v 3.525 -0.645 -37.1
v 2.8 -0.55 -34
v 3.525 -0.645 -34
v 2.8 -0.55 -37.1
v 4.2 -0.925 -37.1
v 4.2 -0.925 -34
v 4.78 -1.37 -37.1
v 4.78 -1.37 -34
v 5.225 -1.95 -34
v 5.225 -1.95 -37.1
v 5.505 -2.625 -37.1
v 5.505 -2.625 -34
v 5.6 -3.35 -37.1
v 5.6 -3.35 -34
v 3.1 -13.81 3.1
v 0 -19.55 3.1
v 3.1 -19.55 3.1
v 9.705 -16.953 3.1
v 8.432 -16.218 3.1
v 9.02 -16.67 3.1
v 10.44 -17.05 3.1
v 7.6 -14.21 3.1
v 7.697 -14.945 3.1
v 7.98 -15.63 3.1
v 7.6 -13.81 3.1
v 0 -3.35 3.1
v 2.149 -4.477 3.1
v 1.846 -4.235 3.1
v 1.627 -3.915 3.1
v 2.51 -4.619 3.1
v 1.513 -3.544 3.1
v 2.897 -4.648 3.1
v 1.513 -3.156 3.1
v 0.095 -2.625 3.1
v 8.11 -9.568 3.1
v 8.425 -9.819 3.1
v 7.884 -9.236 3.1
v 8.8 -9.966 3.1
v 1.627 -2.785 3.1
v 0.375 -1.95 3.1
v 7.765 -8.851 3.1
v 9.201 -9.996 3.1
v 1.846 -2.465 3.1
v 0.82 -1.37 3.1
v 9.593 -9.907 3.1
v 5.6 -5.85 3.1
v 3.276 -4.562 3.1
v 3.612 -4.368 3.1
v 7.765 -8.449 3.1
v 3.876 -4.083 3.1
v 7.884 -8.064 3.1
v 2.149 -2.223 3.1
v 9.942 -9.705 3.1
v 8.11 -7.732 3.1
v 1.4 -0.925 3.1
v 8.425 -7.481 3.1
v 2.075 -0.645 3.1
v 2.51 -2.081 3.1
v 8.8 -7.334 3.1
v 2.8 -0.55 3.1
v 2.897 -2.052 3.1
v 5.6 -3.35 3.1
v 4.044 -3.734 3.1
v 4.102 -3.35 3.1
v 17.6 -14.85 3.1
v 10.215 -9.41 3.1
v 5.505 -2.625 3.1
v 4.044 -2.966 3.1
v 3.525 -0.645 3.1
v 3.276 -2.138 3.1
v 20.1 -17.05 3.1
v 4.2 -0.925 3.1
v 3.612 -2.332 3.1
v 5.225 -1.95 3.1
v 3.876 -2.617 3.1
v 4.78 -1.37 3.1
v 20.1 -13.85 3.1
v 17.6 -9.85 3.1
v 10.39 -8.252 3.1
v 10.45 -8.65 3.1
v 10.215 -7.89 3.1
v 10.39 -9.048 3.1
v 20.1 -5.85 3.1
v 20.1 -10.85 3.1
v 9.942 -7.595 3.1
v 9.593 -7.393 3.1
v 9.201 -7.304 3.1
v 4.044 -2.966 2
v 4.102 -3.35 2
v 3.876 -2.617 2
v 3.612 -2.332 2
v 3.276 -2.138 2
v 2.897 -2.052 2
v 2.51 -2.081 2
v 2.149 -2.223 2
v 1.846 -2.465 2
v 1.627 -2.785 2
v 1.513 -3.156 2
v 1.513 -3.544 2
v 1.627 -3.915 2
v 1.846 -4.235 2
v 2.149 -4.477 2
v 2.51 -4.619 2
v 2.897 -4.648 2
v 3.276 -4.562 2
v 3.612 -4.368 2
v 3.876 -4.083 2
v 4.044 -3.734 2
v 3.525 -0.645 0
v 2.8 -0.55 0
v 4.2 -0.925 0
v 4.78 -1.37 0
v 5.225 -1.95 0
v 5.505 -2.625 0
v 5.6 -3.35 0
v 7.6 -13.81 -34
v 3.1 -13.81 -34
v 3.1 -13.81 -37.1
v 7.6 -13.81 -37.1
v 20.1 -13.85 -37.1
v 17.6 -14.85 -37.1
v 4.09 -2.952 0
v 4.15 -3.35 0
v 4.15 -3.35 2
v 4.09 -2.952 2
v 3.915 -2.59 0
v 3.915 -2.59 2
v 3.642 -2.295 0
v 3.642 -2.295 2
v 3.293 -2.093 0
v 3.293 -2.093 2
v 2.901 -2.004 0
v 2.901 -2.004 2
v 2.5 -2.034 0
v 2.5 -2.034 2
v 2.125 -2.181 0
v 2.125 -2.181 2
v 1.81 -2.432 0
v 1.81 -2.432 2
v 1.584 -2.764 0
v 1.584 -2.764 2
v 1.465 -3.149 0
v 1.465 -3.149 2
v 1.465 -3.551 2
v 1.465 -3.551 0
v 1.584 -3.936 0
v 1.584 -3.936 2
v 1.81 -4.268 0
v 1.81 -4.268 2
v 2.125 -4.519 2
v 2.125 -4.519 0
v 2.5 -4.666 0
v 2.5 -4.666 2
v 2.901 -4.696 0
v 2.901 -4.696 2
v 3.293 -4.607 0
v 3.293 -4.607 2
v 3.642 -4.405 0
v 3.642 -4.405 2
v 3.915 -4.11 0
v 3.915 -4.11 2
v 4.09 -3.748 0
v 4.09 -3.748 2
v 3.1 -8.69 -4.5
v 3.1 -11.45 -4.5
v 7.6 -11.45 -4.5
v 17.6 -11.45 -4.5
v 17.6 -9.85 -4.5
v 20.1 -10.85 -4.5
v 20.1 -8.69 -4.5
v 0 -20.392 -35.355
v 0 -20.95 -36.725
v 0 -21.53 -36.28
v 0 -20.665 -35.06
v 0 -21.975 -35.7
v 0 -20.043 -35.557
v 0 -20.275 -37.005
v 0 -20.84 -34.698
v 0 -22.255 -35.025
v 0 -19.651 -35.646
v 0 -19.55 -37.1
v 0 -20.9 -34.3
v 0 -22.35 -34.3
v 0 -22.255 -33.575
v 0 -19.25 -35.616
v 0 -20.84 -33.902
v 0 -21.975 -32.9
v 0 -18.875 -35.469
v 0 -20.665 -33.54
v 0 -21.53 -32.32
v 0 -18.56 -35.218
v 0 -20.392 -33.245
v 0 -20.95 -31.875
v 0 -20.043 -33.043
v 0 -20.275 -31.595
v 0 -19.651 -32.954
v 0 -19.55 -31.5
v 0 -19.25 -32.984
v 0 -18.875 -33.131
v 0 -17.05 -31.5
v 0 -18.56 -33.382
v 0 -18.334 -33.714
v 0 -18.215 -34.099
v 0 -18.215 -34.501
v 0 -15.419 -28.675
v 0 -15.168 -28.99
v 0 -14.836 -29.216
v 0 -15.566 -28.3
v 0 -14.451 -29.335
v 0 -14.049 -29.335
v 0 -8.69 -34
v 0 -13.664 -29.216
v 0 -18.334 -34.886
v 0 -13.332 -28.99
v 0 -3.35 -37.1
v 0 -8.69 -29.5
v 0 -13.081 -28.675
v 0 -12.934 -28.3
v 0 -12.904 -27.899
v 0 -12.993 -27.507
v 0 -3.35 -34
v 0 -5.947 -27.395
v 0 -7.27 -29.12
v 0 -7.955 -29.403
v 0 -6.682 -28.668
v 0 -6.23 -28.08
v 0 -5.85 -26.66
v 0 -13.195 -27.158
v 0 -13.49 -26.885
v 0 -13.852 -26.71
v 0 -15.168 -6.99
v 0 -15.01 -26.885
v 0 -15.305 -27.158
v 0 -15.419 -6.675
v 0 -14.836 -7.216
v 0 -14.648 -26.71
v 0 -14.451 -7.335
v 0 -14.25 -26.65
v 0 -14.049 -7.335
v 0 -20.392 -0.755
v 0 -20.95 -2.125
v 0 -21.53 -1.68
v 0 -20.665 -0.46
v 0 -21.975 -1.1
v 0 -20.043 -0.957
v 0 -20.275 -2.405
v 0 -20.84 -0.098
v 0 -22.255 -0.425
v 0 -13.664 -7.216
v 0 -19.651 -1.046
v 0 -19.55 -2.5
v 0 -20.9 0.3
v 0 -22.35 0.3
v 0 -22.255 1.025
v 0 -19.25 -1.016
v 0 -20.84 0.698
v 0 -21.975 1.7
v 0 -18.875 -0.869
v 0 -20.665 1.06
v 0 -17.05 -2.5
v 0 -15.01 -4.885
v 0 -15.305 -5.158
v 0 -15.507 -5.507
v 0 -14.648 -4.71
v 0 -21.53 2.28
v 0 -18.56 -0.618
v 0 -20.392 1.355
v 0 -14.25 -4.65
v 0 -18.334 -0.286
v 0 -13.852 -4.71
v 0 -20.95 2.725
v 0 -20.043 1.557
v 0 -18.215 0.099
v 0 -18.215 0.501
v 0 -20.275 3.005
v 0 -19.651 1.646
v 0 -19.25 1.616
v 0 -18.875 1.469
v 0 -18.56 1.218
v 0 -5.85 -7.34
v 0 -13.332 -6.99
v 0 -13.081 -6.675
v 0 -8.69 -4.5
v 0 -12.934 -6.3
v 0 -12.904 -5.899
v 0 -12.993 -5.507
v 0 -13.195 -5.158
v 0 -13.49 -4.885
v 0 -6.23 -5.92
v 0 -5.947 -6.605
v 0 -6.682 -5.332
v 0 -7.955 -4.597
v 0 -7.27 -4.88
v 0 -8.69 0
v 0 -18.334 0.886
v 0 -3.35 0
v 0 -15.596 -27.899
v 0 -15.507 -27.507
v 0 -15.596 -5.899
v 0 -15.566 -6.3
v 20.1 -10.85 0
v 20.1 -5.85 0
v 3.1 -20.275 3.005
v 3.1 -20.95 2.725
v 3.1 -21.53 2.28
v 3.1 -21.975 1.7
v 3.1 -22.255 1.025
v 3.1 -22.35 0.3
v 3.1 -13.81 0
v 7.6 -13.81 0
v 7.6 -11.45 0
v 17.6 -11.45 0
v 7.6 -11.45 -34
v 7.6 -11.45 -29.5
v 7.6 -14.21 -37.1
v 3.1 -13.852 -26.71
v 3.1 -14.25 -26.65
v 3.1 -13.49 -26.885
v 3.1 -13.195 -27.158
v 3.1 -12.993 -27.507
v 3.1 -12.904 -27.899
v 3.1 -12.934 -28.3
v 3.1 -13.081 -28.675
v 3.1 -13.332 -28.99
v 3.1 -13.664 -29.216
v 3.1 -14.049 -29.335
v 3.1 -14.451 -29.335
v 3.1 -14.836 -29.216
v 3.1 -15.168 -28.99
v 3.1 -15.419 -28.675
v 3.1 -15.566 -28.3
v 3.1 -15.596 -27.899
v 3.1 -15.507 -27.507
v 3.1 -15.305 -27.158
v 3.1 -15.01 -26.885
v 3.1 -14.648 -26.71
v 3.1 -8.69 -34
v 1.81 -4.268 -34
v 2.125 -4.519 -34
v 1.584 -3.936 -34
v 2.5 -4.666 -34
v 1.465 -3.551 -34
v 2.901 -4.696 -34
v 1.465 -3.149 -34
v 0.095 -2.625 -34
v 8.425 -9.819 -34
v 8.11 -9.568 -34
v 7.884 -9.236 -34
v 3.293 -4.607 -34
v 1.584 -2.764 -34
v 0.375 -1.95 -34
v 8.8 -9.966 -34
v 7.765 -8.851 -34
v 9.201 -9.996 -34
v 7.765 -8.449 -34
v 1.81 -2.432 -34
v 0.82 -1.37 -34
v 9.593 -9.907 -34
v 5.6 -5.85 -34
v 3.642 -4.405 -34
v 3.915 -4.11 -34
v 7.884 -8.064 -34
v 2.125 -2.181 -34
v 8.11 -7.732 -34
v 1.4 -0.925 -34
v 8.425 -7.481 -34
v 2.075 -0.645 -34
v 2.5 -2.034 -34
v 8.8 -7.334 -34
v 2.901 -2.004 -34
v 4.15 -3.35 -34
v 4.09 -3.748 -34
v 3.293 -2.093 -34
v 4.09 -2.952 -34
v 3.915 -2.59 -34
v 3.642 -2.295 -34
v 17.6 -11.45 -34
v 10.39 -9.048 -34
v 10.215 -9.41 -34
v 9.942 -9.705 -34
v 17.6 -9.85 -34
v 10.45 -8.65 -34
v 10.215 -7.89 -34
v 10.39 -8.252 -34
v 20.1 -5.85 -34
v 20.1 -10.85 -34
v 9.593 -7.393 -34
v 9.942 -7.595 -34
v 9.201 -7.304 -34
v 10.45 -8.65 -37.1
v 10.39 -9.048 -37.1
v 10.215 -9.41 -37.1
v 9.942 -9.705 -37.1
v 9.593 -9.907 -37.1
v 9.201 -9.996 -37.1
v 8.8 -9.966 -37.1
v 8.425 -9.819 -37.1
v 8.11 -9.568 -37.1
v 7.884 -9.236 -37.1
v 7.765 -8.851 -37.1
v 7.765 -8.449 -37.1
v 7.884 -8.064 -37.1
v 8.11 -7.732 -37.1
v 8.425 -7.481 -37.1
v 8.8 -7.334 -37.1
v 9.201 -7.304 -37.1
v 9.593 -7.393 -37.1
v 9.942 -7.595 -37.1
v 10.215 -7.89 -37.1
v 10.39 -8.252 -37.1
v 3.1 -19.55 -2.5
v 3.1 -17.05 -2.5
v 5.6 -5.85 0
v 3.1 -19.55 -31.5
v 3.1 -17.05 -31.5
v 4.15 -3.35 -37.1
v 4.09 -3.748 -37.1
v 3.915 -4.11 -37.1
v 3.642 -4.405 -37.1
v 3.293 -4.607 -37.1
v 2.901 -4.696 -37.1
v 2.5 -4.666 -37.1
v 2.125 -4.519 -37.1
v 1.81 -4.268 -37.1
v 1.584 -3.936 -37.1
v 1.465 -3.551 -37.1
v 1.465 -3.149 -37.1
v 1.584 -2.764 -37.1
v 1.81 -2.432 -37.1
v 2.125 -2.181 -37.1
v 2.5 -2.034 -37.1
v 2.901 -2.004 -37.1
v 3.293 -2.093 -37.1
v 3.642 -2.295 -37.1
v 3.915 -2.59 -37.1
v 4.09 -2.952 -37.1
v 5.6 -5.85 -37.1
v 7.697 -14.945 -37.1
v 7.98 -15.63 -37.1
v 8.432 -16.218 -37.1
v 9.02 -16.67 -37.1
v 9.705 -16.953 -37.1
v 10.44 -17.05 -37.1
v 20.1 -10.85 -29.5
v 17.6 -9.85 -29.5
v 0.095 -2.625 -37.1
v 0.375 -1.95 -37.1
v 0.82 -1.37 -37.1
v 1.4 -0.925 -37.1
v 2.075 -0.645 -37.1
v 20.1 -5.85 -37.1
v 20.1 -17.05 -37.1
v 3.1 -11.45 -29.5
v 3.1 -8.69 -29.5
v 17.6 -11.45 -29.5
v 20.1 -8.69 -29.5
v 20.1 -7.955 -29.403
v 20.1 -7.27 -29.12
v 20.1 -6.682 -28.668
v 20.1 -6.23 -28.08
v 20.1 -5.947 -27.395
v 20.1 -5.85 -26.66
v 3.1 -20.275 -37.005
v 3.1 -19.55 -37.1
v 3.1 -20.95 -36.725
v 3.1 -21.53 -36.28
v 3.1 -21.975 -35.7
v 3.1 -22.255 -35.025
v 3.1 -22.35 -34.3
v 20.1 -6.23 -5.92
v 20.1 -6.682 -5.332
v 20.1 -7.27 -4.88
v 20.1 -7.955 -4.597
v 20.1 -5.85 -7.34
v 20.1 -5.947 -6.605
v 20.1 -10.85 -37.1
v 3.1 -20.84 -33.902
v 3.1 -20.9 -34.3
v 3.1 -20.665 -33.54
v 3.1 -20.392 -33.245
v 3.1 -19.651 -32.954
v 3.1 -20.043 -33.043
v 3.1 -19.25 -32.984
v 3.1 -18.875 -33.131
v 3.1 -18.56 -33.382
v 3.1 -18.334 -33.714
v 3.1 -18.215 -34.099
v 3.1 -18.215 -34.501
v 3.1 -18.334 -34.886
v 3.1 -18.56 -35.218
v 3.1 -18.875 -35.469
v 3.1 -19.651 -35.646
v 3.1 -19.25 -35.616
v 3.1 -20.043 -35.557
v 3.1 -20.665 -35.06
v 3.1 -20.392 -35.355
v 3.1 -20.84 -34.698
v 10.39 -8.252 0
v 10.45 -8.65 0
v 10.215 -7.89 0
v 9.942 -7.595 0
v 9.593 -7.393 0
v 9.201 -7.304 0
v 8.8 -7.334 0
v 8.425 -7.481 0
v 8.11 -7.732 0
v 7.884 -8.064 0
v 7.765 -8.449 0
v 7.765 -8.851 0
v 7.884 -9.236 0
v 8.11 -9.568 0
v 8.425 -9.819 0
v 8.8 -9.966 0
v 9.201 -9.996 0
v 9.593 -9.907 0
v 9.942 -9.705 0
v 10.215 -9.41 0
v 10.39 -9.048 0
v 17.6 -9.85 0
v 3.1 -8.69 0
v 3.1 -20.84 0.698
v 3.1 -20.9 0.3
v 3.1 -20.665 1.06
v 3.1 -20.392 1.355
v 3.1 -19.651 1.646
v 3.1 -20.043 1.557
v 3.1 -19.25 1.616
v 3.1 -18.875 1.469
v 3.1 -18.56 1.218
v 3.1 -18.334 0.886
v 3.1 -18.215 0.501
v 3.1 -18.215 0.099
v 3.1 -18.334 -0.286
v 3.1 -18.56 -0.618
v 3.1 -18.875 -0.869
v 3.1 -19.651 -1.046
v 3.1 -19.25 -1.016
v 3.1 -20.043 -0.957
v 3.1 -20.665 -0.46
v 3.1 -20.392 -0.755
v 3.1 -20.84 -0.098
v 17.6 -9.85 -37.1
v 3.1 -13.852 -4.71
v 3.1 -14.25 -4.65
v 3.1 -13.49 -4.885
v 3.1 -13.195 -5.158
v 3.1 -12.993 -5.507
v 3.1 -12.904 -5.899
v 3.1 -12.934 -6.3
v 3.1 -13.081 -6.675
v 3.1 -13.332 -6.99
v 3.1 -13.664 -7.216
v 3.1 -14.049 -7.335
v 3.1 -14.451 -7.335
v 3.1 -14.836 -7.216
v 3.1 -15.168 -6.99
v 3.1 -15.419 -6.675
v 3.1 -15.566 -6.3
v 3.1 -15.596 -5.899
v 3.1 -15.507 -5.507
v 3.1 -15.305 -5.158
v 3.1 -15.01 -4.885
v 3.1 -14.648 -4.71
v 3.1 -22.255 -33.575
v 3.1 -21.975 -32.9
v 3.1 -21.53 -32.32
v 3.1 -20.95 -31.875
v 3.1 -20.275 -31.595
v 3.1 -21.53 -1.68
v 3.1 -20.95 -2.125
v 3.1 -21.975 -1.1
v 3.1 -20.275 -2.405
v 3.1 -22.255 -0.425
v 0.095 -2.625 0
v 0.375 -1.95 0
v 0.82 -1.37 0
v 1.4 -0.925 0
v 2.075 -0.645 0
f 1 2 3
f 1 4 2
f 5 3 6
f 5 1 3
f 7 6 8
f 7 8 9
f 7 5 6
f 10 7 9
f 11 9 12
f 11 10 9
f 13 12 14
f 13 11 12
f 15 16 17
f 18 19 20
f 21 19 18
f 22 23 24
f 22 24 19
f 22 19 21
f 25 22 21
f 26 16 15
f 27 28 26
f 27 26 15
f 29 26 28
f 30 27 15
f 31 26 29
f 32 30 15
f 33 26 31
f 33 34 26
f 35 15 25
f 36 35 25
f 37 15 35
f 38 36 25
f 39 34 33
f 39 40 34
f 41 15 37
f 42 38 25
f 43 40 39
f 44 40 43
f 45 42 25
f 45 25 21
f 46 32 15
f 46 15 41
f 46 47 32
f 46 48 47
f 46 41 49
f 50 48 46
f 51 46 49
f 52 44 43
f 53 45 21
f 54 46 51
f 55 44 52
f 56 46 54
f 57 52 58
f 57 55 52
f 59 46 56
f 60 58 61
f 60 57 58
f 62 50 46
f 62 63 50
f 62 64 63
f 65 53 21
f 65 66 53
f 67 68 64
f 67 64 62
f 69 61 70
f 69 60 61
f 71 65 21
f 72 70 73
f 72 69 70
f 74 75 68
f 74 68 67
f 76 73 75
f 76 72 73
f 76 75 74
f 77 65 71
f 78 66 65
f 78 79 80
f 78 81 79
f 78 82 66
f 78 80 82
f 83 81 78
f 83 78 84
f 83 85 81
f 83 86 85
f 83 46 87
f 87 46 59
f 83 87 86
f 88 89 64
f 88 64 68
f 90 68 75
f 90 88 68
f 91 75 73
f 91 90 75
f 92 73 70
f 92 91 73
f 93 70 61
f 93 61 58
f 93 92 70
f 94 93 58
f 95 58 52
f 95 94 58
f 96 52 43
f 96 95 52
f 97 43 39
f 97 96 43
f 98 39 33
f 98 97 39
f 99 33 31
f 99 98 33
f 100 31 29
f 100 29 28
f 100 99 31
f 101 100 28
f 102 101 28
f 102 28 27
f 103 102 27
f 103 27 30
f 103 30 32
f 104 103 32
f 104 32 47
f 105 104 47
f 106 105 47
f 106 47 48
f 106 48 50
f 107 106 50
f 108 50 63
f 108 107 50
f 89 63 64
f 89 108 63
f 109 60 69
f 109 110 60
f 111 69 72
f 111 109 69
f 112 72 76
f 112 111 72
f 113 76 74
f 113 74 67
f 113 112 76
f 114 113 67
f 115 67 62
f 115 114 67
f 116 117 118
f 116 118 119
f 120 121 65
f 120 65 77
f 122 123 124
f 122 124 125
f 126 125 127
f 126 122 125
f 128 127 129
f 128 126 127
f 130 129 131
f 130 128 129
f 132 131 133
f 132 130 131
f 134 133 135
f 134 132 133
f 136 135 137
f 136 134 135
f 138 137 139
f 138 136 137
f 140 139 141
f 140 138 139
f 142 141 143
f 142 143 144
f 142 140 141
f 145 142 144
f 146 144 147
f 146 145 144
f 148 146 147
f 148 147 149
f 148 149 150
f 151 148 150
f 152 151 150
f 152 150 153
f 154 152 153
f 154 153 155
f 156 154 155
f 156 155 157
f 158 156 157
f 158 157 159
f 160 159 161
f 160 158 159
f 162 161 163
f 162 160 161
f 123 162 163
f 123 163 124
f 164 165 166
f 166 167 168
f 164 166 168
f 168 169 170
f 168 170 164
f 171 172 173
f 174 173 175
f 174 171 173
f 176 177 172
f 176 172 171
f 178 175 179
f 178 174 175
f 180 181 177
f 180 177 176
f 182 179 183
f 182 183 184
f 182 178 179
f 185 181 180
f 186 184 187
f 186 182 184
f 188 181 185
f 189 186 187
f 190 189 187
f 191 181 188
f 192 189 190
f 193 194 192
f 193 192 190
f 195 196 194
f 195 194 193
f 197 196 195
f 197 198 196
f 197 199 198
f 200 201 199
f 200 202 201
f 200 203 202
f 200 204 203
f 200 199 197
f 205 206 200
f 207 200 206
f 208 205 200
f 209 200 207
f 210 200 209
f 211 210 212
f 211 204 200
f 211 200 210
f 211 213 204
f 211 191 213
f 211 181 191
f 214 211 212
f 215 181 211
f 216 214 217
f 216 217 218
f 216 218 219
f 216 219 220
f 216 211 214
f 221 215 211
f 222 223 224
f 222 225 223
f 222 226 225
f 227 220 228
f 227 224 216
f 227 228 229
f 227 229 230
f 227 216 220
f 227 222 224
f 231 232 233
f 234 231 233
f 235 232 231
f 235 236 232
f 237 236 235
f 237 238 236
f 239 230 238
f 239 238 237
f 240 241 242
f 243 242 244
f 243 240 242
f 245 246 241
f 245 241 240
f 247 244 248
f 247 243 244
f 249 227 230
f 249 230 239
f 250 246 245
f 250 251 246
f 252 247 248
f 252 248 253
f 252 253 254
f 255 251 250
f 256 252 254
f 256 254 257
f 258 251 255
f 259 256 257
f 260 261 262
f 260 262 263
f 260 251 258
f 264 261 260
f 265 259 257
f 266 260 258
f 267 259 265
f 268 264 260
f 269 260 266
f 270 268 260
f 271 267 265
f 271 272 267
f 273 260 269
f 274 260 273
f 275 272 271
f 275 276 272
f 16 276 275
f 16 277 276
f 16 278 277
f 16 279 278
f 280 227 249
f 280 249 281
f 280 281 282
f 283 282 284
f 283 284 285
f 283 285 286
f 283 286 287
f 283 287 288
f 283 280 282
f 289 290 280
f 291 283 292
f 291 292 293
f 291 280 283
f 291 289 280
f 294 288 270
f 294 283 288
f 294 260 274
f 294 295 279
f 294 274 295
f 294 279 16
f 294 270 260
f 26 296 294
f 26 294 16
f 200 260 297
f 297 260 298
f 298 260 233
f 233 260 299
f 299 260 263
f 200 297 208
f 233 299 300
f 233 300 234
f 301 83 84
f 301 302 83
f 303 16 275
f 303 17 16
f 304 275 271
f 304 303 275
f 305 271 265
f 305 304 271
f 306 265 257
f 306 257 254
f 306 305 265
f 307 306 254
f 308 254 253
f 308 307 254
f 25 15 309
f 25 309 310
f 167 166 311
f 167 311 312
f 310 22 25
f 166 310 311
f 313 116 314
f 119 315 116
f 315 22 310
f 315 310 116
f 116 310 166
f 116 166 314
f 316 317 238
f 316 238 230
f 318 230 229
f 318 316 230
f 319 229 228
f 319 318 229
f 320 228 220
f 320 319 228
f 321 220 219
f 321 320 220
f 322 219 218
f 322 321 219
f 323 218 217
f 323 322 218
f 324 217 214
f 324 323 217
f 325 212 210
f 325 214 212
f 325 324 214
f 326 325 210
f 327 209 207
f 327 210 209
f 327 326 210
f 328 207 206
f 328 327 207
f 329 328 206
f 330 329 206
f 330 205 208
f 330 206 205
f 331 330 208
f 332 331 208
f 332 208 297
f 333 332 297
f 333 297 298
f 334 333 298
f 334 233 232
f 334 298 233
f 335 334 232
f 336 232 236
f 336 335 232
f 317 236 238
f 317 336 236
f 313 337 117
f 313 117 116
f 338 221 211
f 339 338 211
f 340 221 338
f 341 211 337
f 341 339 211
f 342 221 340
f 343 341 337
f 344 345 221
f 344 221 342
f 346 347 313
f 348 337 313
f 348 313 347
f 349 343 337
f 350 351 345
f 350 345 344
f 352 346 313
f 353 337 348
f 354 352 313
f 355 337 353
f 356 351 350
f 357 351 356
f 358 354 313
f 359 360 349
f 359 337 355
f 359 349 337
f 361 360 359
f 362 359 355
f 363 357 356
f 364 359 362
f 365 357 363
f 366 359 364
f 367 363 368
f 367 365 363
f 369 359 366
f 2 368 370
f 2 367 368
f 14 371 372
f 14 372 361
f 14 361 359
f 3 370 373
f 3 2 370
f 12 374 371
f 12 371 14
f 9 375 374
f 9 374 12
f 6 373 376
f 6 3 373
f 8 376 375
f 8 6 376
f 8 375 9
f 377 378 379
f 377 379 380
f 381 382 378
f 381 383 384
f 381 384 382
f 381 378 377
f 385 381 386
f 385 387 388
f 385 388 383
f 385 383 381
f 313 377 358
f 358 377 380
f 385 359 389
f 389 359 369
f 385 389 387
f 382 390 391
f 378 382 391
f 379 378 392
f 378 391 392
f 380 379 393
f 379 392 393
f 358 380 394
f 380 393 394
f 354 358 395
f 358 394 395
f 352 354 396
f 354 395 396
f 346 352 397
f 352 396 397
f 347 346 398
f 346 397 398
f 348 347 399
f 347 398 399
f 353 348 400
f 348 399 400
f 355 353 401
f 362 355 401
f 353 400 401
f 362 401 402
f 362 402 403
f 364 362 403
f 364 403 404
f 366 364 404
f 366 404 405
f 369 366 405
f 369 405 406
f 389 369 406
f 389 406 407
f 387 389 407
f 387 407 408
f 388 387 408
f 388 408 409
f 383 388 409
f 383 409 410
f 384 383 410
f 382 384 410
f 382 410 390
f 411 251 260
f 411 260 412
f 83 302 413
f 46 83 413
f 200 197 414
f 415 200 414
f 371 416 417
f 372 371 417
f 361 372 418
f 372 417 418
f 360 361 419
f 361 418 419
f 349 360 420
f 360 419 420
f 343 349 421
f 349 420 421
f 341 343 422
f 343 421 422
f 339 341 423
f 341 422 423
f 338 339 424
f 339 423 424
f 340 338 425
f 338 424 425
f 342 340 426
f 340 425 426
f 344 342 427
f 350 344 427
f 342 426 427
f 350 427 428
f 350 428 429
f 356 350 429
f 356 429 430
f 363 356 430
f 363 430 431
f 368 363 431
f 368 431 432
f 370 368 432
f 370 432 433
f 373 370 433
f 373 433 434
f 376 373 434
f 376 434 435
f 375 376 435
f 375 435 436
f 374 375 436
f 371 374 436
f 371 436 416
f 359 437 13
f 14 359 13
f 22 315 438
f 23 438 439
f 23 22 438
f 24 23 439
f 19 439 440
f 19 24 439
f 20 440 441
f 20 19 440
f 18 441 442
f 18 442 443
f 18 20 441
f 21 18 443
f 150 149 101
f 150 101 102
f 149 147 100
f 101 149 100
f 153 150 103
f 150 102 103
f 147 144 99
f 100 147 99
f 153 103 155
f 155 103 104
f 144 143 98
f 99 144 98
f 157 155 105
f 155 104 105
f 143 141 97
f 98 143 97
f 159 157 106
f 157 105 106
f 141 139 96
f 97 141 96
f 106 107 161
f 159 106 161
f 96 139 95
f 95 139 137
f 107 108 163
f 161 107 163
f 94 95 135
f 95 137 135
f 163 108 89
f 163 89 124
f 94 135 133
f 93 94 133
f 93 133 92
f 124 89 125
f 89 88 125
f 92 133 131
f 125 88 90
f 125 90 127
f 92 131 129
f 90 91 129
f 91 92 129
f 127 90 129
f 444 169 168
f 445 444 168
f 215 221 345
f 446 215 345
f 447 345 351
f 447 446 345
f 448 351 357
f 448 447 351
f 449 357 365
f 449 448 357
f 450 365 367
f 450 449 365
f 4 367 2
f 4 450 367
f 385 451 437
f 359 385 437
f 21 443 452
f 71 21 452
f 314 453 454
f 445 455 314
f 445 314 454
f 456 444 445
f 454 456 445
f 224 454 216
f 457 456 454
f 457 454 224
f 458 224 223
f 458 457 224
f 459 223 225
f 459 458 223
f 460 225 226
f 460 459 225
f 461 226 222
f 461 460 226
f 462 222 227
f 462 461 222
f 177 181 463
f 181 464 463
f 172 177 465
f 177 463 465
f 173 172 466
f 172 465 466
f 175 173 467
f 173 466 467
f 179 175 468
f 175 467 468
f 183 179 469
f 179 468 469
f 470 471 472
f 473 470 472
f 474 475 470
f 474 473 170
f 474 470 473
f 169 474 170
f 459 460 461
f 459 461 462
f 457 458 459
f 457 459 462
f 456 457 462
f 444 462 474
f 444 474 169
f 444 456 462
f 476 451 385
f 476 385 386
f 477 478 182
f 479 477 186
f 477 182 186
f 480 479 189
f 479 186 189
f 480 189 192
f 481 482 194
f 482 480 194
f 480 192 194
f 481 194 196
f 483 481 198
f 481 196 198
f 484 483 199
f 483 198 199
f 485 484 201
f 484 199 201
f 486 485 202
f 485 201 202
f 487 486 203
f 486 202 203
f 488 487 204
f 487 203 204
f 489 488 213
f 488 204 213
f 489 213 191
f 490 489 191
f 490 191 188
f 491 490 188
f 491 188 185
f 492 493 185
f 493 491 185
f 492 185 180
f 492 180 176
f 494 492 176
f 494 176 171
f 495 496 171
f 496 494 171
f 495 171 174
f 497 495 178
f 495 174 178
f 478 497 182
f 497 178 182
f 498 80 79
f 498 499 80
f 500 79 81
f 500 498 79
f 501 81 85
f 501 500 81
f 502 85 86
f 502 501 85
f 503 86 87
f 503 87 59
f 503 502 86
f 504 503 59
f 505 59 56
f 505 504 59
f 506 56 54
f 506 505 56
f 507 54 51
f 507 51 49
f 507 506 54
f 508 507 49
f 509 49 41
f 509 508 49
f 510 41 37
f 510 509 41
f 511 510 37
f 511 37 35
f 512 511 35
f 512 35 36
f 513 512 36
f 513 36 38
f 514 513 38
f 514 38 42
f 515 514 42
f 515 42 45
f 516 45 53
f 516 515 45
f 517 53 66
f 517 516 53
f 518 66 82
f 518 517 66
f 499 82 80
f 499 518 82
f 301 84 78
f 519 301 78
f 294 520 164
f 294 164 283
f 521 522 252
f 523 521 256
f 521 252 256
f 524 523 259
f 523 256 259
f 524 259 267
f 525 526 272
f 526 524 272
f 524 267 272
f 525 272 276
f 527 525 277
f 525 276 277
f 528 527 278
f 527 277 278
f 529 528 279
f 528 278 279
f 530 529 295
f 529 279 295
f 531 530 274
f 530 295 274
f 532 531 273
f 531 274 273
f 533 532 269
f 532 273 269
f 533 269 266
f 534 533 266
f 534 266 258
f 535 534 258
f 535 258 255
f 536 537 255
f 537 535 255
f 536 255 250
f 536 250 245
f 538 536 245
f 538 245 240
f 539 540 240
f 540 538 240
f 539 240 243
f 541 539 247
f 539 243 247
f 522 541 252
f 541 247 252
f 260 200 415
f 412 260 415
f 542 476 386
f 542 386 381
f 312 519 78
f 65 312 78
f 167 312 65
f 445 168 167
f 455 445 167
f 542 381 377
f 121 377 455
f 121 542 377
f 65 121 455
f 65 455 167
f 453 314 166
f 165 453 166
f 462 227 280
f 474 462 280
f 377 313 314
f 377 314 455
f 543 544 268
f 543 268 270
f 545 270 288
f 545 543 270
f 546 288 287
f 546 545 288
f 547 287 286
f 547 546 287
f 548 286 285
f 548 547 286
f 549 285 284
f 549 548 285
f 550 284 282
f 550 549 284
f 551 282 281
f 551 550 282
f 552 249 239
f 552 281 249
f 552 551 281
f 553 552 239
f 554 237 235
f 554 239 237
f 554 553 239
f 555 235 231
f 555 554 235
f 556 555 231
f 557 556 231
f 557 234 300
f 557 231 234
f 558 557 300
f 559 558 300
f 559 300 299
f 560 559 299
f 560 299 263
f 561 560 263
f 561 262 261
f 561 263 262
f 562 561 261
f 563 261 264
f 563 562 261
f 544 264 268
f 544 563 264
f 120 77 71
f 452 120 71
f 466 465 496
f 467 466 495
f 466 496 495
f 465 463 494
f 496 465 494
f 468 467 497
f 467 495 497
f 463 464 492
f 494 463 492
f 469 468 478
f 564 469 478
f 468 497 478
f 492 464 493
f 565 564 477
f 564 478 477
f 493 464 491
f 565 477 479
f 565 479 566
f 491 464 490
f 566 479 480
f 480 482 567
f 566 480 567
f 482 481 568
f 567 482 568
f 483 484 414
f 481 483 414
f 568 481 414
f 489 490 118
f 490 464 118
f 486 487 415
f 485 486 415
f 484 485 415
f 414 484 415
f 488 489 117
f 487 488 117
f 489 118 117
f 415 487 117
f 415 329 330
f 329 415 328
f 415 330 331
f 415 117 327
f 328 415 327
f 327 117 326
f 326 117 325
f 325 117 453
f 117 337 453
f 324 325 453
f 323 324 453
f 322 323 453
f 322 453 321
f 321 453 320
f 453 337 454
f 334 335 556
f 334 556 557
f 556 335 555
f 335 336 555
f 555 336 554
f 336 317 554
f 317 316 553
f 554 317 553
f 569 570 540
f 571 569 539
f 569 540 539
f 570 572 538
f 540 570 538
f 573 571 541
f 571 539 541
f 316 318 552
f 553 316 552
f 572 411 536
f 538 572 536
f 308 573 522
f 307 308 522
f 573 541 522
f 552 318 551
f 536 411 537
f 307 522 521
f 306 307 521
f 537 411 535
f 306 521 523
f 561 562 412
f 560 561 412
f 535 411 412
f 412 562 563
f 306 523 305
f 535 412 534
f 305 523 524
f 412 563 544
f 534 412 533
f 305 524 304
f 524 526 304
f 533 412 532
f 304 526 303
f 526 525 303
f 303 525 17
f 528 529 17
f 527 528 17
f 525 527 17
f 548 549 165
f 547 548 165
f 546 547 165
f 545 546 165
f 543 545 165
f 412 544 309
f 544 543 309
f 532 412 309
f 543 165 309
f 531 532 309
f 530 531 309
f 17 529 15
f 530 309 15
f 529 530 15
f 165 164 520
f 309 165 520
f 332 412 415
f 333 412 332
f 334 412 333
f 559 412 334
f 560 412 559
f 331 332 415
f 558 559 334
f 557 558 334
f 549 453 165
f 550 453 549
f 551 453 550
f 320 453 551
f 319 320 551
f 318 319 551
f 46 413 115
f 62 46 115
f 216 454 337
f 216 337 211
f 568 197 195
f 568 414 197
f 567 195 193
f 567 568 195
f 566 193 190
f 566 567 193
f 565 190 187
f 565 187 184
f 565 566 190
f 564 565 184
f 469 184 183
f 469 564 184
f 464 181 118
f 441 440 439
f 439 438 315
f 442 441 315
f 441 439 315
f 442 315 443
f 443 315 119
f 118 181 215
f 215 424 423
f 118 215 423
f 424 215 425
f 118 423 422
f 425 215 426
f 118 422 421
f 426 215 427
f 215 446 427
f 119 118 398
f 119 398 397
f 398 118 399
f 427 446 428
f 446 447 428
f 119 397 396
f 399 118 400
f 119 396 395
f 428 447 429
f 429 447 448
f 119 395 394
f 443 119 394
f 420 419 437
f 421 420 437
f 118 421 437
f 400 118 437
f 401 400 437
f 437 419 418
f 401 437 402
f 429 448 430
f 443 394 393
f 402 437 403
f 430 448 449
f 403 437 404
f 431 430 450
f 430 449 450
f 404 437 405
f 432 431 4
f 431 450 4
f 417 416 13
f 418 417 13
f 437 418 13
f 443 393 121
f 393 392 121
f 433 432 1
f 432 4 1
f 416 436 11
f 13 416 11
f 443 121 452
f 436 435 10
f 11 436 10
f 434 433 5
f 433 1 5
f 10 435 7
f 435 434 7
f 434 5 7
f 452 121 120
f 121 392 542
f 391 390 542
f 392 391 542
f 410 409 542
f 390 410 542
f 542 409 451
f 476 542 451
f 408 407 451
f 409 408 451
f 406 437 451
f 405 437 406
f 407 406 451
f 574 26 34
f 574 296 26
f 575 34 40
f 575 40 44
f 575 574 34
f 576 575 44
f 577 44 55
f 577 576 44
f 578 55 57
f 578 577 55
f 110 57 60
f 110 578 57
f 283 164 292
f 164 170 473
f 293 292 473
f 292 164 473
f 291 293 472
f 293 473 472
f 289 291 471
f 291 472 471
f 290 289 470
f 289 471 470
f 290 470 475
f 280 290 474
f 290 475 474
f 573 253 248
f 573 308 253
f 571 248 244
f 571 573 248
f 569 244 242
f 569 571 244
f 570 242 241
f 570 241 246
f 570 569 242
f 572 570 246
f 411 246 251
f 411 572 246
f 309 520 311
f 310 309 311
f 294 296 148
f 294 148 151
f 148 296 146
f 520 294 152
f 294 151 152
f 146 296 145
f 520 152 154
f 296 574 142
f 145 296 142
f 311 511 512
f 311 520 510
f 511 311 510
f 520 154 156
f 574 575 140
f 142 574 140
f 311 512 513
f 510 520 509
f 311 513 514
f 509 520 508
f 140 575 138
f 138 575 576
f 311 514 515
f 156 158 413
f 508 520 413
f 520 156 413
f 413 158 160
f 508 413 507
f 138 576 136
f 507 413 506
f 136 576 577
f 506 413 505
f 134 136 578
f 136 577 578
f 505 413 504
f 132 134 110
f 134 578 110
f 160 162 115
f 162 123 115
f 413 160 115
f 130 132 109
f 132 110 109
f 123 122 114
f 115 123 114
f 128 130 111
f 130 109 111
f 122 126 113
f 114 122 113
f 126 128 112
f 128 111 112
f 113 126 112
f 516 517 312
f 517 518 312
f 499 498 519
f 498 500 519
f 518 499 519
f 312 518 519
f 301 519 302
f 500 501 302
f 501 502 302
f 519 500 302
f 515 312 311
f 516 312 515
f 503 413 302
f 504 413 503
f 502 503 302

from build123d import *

# Parameters (mm, degrees)
ESBO_O1_R                  = 1.35
RESSALTO_EXTRUS_O1_DEPTH   = 2
ESBO_O3_W                  = 40.2
ESBO_O3_H                  = 2
RESSALTO_EXTRUS_O2_DEPTH   = 10.08
ESBO_O4_W                  = 3.1
ESBO_O4_H                  = 12.84
RESSALTO_EXTRUS_O3_DEPTH   = 34
CORTE_EXTRUS_O1_DEPTH      = 55.735280213
CORTE_EXTRUS_O1_DEPTH_BACK = 55.735280213
ESBO_O5_R                  = 1.35
ESBO_O7_W                  = 37.1
ESBO_O7_H                  = 3.24
CORTE_EXTRUS_O2_DEPTH      = 2
RESSALTO_EXTRUS_O5_START   = 2
ESBO_O12_R                 = 1.35
RESSALTO_EXTRUS_O5_DEPTH   = 2
ESBO_O18_W                 = 3.1
ESBO_O18_H                 = 3.24
RESSALTO_EXTRUS_O6_DEPTH   = 2
ESBO_O19_W                 = 3.1
ESBO_O19_H                 = 3.24
RESSALTO_EXTRUS_O7_DEPTH   = 2
ESBO_O21_R                 = 1.301764144
ESBO_O21_R_2               = 1.35
RESSALTO_EXTRUS_O8_DEPTH   = 1.1
RESSALTO_EXTRUS_O9_START   = 1.1
ESBO_O22_R                 = 1.35
RESSALTO_EXTRUS_O9_DEPTH   = 1.1
ESBO_O23_W                 = 3.1
ESBO_O23_H                 = 5.6
RESSALTO_EXTRUS_O10_DEPTH  = 5.85
CORTE_EXTRUS_O3_REACH      = 63.173
ESBO_O24_R                 = 1.35
ESBO_O25_W                 = 4.5
ESBO_O25_H                 = 3.1
CORTE_EXTRUS_O6_DEPTH      = 4.48
ESBO_O27_W                 = 3.1
ESBO_O27_H                 = 29
CORTE_EXTRUS_O7_DEPTH      = 4.48
ESBO_O28_W                 = 25
ESBO_O28_H                 = 40.2
CORTE_EXTRUS_O8_DEPTH      = 1.24
ESBO_O29_W                 = 25
ESBO_O29_H                 = 5.6
RESSALTO_EXTRUS_O11_DEPTH  = 34
ESBO_O31_W                 = 3.1
ESBO_O31_H                 = 25
RESSALTO_EXTRUS_O12_DEPTH  = 2.84
ESBO_O32_W                 = 25
ESBO_O32_H                 = 5.6
RESSALTO_EXTRUS_O13_DEPTH  = 34
FILETE1_R                  = 2.84
ESBO_O33_W                 = 5.6
ESBO_O33_H                 = 3.1
CORTE_EXTRUS_O9_DEPTH      = 0.55
ESBO_O35_W                 = 3.1
ESBO_O35_H                 = 5.6
CORTE_EXTRUS_O10_DEPTH     = 5.03
FILETE2_R                  = 2.8
DIVIDIR1_SURFACE_1_BACK    = 61.888
DIVIDIR1_SURFACE_1_DEPTH   = 123.776
DIVIDIR1_SURFACE_2_BACK    = 61.888
DIVIDIR1_SURFACE_2_DEPTH   = 123.776


with BuildPart() as part:
    # Esboço1 → Ressalto-extrusão1 (new body)
    with BuildSketch(Plane.XY):
        Polygon((0, 0), (5.6, 0), (5.6, -5.85), (34.6, -5.85), (34.6, 0), (40.2, 0), (40.2, -11.45), (0, -11.45), align=None)
        with Locations((2.8, -3.35)):
            Circle(ESBO_O1_R, mode=Mode.SUBTRACT)
        with Locations((37.4, -3.35)):
            Circle(ESBO_O1_R, mode=Mode.SUBTRACT)
        with Locations((31.1, -8.65)):
            Circle(ESBO_O1_R, mode=Mode.SUBTRACT)
        with Locations((9.1, -8.65)):
            Circle(ESBO_O1_R, mode=Mode.SUBTRACT)
    extrude(amount=RESSALTO_EXTRUS_O1_DEPTH)

    # Esboço3 → Ressalto-extrusão2 (add)
    with BuildSketch(Plane.XZ.offset(11.45)):
        with Locations((20.1, 1)):
            Rectangle(ESBO_O3_W, ESBO_O3_H)
    extrude(amount=RESSALTO_EXTRUS_O2_DEPTH)

    # Esboço4 → Ressalto-extrusão3 (add)
    with BuildSketch(Plane(origin=(0, 0, 0), x_dir=(-1, 0, 0), z_dir=(0, 0, -1))):
        with Locations((-38.65, -15.11)):
            Rectangle(ESBO_O4_W, ESBO_O4_H)
        with Locations((-1.55, -15.11)):
            Rectangle(ESBO_O4_W, ESBO_O4_H)
    extrude(amount=RESSALTO_EXTRUS_O3_DEPTH)

    # Esboço5 → Corte-extrusão1 (cut, two sides: drawn at the far end of the back side and taken through both)
    with BuildSketch(Plane.ZY.offset(-37.1).offset(-CORTE_EXTRUS_O1_DEPTH_BACK)):
        with Locations((-6, -14.25)):
            Circle(ESBO_O5_R)
        with Locations((-28, -14.25)):
            Circle(ESBO_O5_R)
    extrude(amount=CORTE_EXTRUS_O1_DEPTH + CORTE_EXTRUS_O1_DEPTH_BACK, mode=Mode.SUBTRACT)

    # Esboço7 → Corte-extrusão2 (cut)
    with BuildSketch(Plane(origin=(0, 0, 0), x_dir=(-1, 0, 0), z_dir=(0, 0, -1))):
        with Locations((-18.55, -19.91)):
            Rectangle(ESBO_O7_W, ESBO_O7_H)
    extrude(amount=-CORTE_EXTRUS_O2_DEPTH, mode=Mode.SUBTRACT)

    # Esboço12 → Ressalto-extrusão5 (add)
    with BuildSketch(Plane(origin=(0, 0, -34), x_dir=(-1, 0, 0), z_dir=(0, 0, -1)).offset(RESSALTO_EXTRUS_O5_START)):
        Polygon((-5.6, 0), (0, 0), (0, -18.29), (-40.2, -18.29), (-40.2, 0), (-34.6, 0), (-34.6, -5.85), (-5.6, -5.85), align=None)
        with Locations(Location((-31.1, -8.65, 0), (0, 0, 180))):
            Circle(ESBO_O12_R, mode=Mode.SUBTRACT)
        with Locations(Location((-9.1, -8.65, 0), (0, 0, 180))):
            Circle(ESBO_O12_R, mode=Mode.SUBTRACT)
        with Locations(Location((-2.8, -3.35, 0), (0, 0, 180))):
            Circle(ESBO_O12_R, mode=Mode.SUBTRACT)
        with Locations(Location((-37.4, -3.35, 0), (0, 0, 180))):
            Circle(ESBO_O12_R, mode=Mode.SUBTRACT)
    extrude(amount=-RESSALTO_EXTRUS_O5_DEPTH)

    # Esboço18 → Ressalto-extrusão6 (add)
    with BuildSketch(Plane.XY):
        with Locations((1.55, -19.91)):
            Rectangle(ESBO_O18_W, ESBO_O18_H)
    extrude(amount=RESSALTO_EXTRUS_O6_DEPTH)

    # Esboço19 → Ressalto-extrusão7 (add)
    with BuildSketch(Plane(origin=(0, 0, -34), x_dir=(-1, 0, 0), z_dir=(0, 0, -1))):
        with Locations((-1.55, -19.91)):
            Rectangle(ESBO_O19_W, ESBO_O19_H)
        with Locations((-38.65, -19.91)):
            Rectangle(ESBO_O19_W, ESBO_O19_H)
    extrude(amount=RESSALTO_EXTRUS_O7_DEPTH)

    # Esboço21 → Ressalto-extrusão8 (add)
    with BuildSketch(Plane.XY.offset(2)):
        Polygon((37.1, -21.53), (40.2, -21.53), (40.2, 0), (34.6, 0), (34.6, -5.85), (5.6, -5.85), (5.6, 0), (0, 0), (0, -21.53), (3.1, -21.53), (3.1, -18.29), (37.1, -18.29), align=None)
        with Locations((2.8, -3.35)):
            Circle(ESBO_O21_R, mode=Mode.SUBTRACT)
        with Locations((9.1, -8.65)):
            Circle(ESBO_O21_R_2, mode=Mode.SUBTRACT)
        with Locations((31.1, -8.65)):
            Circle(ESBO_O21_R_2, mode=Mode.SUBTRACT)
        with Locations((37.4, -3.35)):
            Circle(ESBO_O21_R_2, mode=Mode.SUBTRACT)
    extrude(amount=RESSALTO_EXTRUS_O8_DEPTH)

    # Esboço22 → Ressalto-extrusão9 (add)
    with BuildSketch(Plane(origin=(0, 0, -36), x_dir=(-1, 0, 0), z_dir=(0, 0, -1)).offset(RESSALTO_EXTRUS_O9_START)):
        Polygon((-5.6, 0), (0, 0), (0, -21.53), (-3.1, -21.53), (-3.1, -18.29), (-37.1, -18.29), (-37.1, -21.53), (-40.2, -21.53), (-40.2, 0), (-34.6, 0), (-34.6, -5.85), (-5.6, -5.85), align=None)
        with Locations(Location((-37.4, -3.35, 0), (0, 0, 180))):
            Circle(ESBO_O22_R, mode=Mode.SUBTRACT)
        with Locations(Location((-31.1, -8.65, 0), (0, 0, 180))):
            Circle(ESBO_O22_R, mode=Mode.SUBTRACT)
        with Locations(Location((-9.1, -8.65, 0), (0, 0, 180))):
            Circle(ESBO_O22_R, mode=Mode.SUBTRACT)
        with Locations(Location((-2.8, -3.35, 0), (0, 0, 180))):
            Circle(ESBO_O22_R, mode=Mode.SUBTRACT)
    extrude(amount=-RESSALTO_EXTRUS_O9_DEPTH)

    # Esboço23 → Ressalto-extrusão10 (add)
    with BuildSketch(Plane.XZ.offset(21.53)):
        with Locations((1.55, 0.3)):
            Rectangle(ESBO_O23_W, ESBO_O23_H)
        with Locations((1.55, -34.3)):
            Rectangle(ESBO_O23_W, ESBO_O23_H)
        with Locations((38.65, -34.3)):
            Rectangle(ESBO_O23_W, ESBO_O23_H)
        with Locations((38.65, 0.3)):
            Rectangle(ESBO_O23_W, ESBO_O23_H)
    extrude(amount=RESSALTO_EXTRUS_O10_DEPTH)

    # Corte-extrusão3: up to this face of the body (flat: up to its plane)
    corte_extrus_o3_end = Plane(part.part.faces().sort_by_distance((40.2, -15.177512698, -17))[0])
    # Esboço24 → Corte-extrusão3 (cut, up to the picked face)
    with BuildSketch(Plane.ZY, mode=Mode.PRIVATE) as corte_extrus_o3_sk1:
        with Locations(Location((-34.3, -19.55, 0), (0, 0, 270))):
            Circle(ESBO_O24_R)
    corte_extrus_o3_tool1 = split(extrude(corte_extrus_o3_sk1.sketch, amount=-CORTE_EXTRUS_O3_REACH, mode=Mode.PRIVATE), bisect_by=corte_extrus_o3_end, keep=Keep.BOTH, mode=Mode.PRIVATE)
    # Esboço24 → Corte-extrusão3 (cut, up to the picked face)
    with BuildSketch(Plane.ZY, mode=Mode.PRIVATE) as corte_extrus_o3_sk2:
        with Locations(Location((0.3, -19.55, 0), (0, 0, 270))):
            Circle(ESBO_O24_R)
    corte_extrus_o3_tool2 = split(extrude(corte_extrus_o3_sk2.sketch, amount=-CORTE_EXTRUS_O3_REACH, mode=Mode.PRIVATE), bisect_by=corte_extrus_o3_end, keep=Keep.BOTH, mode=Mode.PRIVATE)
    add(corte_extrus_o3_tool1.solids().sort_by(Axis((0, -19.55, -34.3), (1, 0, 0)))[0], mode=Mode.SUBTRACT)
    add(corte_extrus_o3_tool2.solids().sort_by(Axis((0, -19.55, 0.3), (1, 0, 0)))[0], mode=Mode.SUBTRACT)

    # Esboço25 → Corte-extrusão6 (cut)
    with BuildSketch(Plane.XZ.offset(18.29)):
        with Locations((5.35, -35.55)):
            Rectangle(ESBO_O25_W, ESBO_O25_H)
        with Locations((34.85, -35.55)):
            Rectangle(ESBO_O25_W, ESBO_O25_H)
        with Locations((34.85, 1.55)):
            Rectangle(ESBO_O25_W, ESBO_O25_H)
        with Locations((5.35, 1.55)):
            Rectangle(ESBO_O25_W, ESBO_O25_H)
    extrude(amount=-CORTE_EXTRUS_O6_DEPTH, mode=Mode.SUBTRACT)

    # Esboço27 → Corte-extrusão7 (cut)
    with BuildSketch(Plane.XZ.offset(21.53)):
        with Locations((1.55, -17)):
            Rectangle(ESBO_O27_W, ESBO_O27_H)
        with Locations((38.65, -17)):
            Rectangle(ESBO_O27_W, ESBO_O27_H)
    extrude(amount=-CORTE_EXTRUS_O7_DEPTH, mode=Mode.SUBTRACT)

    # Esboço28 → Corte-extrusão8 (cut)
    with BuildSketch(Plane.XZ.offset(18.29)):
        with Locations((20.1, -17)):
            Rectangle(ESBO_O28_W, ESBO_O28_H)
    extrude(amount=-CORTE_EXTRUS_O8_DEPTH, mode=Mode.SUBTRACT)

    # Esboço29 → Ressalto-extrusão11 (add)
    with BuildSketch(Plane.XY.offset(-34)):
        with Locations((20.1, -14.25)):
            Rectangle(ESBO_O29_W, ESBO_O29_H)
    extrude(amount=RESSALTO_EXTRUS_O11_DEPTH)

    # Esboço31 → Ressalto-extrusão12 (add)
    with BuildSketch(Plane(origin=(0, -8.69, 0), x_dir=(1, 0, 0), z_dir=(0, 1, 0))):
        with Locations((1.55, 17)):
            Rectangle(ESBO_O31_W, ESBO_O31_H)
        with Locations((38.65, 17)):
            Rectangle(ESBO_O31_W, ESBO_O31_H)
    extrude(amount=RESSALTO_EXTRUS_O12_DEPTH)

    # Esboço32 → Ressalto-extrusão13 (add)
    with BuildSketch(Plane.ZY.offset(-37.1)):
        with Locations((-17, -8.65)):
            Rectangle(ESBO_O32_W, ESBO_O32_H)
    extrude(amount=RESSALTO_EXTRUS_O13_DEPTH)

    # Filete1
    filete1_edges = [part.edges().sort_by_distance(p)[0] for p in [
        (32.6, -17.05, -17),
        (7.6, -17.05, -17),
        (20.1, -5.85, -29.5),
        (20.1, -5.85, -4.5),
    ]]
    fillet(filete1_edges, radius=FILETE1_R)

    # Esboço33 → Corte-extrusão9 (cut)
    with BuildSketch(Plane(origin=(0, 0, 0), x_dir=(1, 0, 0), z_dir=(0, 1, 0))):
        with Locations((2.8, 35.55)):
            Rectangle(ESBO_O33_W, ESBO_O33_H)
        with Locations((37.4, 35.55)):
            Rectangle(ESBO_O33_W, ESBO_O33_H)
        with Locations((37.4, -1.55)):
            Rectangle(ESBO_O33_W, ESBO_O33_H)
        with Locations((2.8, -1.55)):
            Rectangle(ESBO_O33_W, ESBO_O33_H)
    extrude(amount=-CORTE_EXTRUS_O9_DEPTH, mode=Mode.SUBTRACT)

    # Esboço35 → Corte-extrusão10 (cut)
    with BuildSketch(Plane.XZ.offset(27.38)):
        with Locations((1.55, 0.3)):
            Rectangle(ESBO_O35_W, ESBO_O35_H)
        with Locations((38.65, 0.3)):
            Rectangle(ESBO_O35_W, ESBO_O35_H)
        with Locations((38.65, -34.3)):
            Rectangle(ESBO_O35_W, ESBO_O35_H)
        with Locations((1.55, -34.3)):
            Rectangle(ESBO_O35_W, ESBO_O35_H)
    extrude(amount=-CORTE_EXTRUS_O10_DEPTH, mode=Mode.SUBTRACT)

    # Filete2
    filete2_edges = [part.edges().sort_by_distance(p)[0] for p in [
        (34.6, -0.55, 1.55),
        (40.2, -0.55, 1.55),
        (0, -0.55, 1.55),
        (5.6, -0.55, 1.55),
        (40.2, -0.55, -35.55),
        (34.6, -0.55, -35.55),
        (5.6, -0.55, -35.55),
        (0, -0.55, -35.55),
        (1.55, -22.35, -31.5),
        (1.55, -22.35, -37.1),
        (38.65, -22.35, -31.5),
        (38.65, -22.35, -37.1),
        (38.65, -22.35, 3.1),
        (38.65, -22.35, -2.5),
        (1.55, -22.35, -2.5),
        (1.55, -22.35, 3.1),
    ]]
    fillet(filete2_edges, radius=FILETE2_R - 0.0001)  # a hair under: the kernel refuses the full size


with BuildPart() as body_2:
    # Dividir1: the piece behind the surface
    add(part.part)
    # Dividir1 surface: a surface, the sketch's curves swept straight by 123.776 mm
    with BuildLine(Plane.XY.offset(3.1).offset(-DIVIDIR1_SURFACE_1_BACK), mode=Mode.PRIVATE) as dividir1_surface_1_path:
        Line((20.1, -0.55), (20.1, -10.85))
        Line((20.1, -10.85), (17.6, -9.85))
        Line((17.6, -9.85), (17.6, -14.85))
        Line((17.6, -14.85), (20.1, -13.85))
        Line((20.1, -13.85), (20.1, -22.35))
    dividir1_surface_1 = Shell.extrude(dividir1_surface_1_path.wire(), (0 * DIVIDIR1_SURFACE_1_DEPTH, 0 * DIVIDIR1_SURFACE_1_DEPTH, 1 * DIVIDIR1_SURFACE_1_DEPTH))
    split(bisect_by=dividir1_surface_1, keep=Keep.BOTTOM)


with BuildPart() as part_1:
    add(part.part)

    # Dividir1: split by a surface, the side it looks to stays
    # Dividir1 surface: a surface, the sketch's curves swept straight by 123.776 mm
    with BuildLine(Plane.XY.offset(3.1).offset(-DIVIDIR1_SURFACE_2_BACK), mode=Mode.PRIVATE) as dividir1_surface_2_path:
        Line((20.1, -0.55), (20.1, -10.85))
        Line((20.1, -10.85), (17.6, -9.85))
        Line((17.6, -9.85), (17.6, -14.85))
        Line((17.6, -14.85), (20.1, -13.85))
        Line((20.1, -13.85), (20.1, -22.35))
    dividir1_surface_2 = Shell.extrude(dividir1_surface_2_path.wire(), (0 * DIVIDIR1_SURFACE_2_DEPTH, 0 * DIVIDIR1_SURFACE_2_DEPTH, 1 * DIVIDIR1_SURFACE_2_DEPTH))
    split(bisect_by=dividir1_surface_2, keep=Keep.TOP)


solid = body_2.part
